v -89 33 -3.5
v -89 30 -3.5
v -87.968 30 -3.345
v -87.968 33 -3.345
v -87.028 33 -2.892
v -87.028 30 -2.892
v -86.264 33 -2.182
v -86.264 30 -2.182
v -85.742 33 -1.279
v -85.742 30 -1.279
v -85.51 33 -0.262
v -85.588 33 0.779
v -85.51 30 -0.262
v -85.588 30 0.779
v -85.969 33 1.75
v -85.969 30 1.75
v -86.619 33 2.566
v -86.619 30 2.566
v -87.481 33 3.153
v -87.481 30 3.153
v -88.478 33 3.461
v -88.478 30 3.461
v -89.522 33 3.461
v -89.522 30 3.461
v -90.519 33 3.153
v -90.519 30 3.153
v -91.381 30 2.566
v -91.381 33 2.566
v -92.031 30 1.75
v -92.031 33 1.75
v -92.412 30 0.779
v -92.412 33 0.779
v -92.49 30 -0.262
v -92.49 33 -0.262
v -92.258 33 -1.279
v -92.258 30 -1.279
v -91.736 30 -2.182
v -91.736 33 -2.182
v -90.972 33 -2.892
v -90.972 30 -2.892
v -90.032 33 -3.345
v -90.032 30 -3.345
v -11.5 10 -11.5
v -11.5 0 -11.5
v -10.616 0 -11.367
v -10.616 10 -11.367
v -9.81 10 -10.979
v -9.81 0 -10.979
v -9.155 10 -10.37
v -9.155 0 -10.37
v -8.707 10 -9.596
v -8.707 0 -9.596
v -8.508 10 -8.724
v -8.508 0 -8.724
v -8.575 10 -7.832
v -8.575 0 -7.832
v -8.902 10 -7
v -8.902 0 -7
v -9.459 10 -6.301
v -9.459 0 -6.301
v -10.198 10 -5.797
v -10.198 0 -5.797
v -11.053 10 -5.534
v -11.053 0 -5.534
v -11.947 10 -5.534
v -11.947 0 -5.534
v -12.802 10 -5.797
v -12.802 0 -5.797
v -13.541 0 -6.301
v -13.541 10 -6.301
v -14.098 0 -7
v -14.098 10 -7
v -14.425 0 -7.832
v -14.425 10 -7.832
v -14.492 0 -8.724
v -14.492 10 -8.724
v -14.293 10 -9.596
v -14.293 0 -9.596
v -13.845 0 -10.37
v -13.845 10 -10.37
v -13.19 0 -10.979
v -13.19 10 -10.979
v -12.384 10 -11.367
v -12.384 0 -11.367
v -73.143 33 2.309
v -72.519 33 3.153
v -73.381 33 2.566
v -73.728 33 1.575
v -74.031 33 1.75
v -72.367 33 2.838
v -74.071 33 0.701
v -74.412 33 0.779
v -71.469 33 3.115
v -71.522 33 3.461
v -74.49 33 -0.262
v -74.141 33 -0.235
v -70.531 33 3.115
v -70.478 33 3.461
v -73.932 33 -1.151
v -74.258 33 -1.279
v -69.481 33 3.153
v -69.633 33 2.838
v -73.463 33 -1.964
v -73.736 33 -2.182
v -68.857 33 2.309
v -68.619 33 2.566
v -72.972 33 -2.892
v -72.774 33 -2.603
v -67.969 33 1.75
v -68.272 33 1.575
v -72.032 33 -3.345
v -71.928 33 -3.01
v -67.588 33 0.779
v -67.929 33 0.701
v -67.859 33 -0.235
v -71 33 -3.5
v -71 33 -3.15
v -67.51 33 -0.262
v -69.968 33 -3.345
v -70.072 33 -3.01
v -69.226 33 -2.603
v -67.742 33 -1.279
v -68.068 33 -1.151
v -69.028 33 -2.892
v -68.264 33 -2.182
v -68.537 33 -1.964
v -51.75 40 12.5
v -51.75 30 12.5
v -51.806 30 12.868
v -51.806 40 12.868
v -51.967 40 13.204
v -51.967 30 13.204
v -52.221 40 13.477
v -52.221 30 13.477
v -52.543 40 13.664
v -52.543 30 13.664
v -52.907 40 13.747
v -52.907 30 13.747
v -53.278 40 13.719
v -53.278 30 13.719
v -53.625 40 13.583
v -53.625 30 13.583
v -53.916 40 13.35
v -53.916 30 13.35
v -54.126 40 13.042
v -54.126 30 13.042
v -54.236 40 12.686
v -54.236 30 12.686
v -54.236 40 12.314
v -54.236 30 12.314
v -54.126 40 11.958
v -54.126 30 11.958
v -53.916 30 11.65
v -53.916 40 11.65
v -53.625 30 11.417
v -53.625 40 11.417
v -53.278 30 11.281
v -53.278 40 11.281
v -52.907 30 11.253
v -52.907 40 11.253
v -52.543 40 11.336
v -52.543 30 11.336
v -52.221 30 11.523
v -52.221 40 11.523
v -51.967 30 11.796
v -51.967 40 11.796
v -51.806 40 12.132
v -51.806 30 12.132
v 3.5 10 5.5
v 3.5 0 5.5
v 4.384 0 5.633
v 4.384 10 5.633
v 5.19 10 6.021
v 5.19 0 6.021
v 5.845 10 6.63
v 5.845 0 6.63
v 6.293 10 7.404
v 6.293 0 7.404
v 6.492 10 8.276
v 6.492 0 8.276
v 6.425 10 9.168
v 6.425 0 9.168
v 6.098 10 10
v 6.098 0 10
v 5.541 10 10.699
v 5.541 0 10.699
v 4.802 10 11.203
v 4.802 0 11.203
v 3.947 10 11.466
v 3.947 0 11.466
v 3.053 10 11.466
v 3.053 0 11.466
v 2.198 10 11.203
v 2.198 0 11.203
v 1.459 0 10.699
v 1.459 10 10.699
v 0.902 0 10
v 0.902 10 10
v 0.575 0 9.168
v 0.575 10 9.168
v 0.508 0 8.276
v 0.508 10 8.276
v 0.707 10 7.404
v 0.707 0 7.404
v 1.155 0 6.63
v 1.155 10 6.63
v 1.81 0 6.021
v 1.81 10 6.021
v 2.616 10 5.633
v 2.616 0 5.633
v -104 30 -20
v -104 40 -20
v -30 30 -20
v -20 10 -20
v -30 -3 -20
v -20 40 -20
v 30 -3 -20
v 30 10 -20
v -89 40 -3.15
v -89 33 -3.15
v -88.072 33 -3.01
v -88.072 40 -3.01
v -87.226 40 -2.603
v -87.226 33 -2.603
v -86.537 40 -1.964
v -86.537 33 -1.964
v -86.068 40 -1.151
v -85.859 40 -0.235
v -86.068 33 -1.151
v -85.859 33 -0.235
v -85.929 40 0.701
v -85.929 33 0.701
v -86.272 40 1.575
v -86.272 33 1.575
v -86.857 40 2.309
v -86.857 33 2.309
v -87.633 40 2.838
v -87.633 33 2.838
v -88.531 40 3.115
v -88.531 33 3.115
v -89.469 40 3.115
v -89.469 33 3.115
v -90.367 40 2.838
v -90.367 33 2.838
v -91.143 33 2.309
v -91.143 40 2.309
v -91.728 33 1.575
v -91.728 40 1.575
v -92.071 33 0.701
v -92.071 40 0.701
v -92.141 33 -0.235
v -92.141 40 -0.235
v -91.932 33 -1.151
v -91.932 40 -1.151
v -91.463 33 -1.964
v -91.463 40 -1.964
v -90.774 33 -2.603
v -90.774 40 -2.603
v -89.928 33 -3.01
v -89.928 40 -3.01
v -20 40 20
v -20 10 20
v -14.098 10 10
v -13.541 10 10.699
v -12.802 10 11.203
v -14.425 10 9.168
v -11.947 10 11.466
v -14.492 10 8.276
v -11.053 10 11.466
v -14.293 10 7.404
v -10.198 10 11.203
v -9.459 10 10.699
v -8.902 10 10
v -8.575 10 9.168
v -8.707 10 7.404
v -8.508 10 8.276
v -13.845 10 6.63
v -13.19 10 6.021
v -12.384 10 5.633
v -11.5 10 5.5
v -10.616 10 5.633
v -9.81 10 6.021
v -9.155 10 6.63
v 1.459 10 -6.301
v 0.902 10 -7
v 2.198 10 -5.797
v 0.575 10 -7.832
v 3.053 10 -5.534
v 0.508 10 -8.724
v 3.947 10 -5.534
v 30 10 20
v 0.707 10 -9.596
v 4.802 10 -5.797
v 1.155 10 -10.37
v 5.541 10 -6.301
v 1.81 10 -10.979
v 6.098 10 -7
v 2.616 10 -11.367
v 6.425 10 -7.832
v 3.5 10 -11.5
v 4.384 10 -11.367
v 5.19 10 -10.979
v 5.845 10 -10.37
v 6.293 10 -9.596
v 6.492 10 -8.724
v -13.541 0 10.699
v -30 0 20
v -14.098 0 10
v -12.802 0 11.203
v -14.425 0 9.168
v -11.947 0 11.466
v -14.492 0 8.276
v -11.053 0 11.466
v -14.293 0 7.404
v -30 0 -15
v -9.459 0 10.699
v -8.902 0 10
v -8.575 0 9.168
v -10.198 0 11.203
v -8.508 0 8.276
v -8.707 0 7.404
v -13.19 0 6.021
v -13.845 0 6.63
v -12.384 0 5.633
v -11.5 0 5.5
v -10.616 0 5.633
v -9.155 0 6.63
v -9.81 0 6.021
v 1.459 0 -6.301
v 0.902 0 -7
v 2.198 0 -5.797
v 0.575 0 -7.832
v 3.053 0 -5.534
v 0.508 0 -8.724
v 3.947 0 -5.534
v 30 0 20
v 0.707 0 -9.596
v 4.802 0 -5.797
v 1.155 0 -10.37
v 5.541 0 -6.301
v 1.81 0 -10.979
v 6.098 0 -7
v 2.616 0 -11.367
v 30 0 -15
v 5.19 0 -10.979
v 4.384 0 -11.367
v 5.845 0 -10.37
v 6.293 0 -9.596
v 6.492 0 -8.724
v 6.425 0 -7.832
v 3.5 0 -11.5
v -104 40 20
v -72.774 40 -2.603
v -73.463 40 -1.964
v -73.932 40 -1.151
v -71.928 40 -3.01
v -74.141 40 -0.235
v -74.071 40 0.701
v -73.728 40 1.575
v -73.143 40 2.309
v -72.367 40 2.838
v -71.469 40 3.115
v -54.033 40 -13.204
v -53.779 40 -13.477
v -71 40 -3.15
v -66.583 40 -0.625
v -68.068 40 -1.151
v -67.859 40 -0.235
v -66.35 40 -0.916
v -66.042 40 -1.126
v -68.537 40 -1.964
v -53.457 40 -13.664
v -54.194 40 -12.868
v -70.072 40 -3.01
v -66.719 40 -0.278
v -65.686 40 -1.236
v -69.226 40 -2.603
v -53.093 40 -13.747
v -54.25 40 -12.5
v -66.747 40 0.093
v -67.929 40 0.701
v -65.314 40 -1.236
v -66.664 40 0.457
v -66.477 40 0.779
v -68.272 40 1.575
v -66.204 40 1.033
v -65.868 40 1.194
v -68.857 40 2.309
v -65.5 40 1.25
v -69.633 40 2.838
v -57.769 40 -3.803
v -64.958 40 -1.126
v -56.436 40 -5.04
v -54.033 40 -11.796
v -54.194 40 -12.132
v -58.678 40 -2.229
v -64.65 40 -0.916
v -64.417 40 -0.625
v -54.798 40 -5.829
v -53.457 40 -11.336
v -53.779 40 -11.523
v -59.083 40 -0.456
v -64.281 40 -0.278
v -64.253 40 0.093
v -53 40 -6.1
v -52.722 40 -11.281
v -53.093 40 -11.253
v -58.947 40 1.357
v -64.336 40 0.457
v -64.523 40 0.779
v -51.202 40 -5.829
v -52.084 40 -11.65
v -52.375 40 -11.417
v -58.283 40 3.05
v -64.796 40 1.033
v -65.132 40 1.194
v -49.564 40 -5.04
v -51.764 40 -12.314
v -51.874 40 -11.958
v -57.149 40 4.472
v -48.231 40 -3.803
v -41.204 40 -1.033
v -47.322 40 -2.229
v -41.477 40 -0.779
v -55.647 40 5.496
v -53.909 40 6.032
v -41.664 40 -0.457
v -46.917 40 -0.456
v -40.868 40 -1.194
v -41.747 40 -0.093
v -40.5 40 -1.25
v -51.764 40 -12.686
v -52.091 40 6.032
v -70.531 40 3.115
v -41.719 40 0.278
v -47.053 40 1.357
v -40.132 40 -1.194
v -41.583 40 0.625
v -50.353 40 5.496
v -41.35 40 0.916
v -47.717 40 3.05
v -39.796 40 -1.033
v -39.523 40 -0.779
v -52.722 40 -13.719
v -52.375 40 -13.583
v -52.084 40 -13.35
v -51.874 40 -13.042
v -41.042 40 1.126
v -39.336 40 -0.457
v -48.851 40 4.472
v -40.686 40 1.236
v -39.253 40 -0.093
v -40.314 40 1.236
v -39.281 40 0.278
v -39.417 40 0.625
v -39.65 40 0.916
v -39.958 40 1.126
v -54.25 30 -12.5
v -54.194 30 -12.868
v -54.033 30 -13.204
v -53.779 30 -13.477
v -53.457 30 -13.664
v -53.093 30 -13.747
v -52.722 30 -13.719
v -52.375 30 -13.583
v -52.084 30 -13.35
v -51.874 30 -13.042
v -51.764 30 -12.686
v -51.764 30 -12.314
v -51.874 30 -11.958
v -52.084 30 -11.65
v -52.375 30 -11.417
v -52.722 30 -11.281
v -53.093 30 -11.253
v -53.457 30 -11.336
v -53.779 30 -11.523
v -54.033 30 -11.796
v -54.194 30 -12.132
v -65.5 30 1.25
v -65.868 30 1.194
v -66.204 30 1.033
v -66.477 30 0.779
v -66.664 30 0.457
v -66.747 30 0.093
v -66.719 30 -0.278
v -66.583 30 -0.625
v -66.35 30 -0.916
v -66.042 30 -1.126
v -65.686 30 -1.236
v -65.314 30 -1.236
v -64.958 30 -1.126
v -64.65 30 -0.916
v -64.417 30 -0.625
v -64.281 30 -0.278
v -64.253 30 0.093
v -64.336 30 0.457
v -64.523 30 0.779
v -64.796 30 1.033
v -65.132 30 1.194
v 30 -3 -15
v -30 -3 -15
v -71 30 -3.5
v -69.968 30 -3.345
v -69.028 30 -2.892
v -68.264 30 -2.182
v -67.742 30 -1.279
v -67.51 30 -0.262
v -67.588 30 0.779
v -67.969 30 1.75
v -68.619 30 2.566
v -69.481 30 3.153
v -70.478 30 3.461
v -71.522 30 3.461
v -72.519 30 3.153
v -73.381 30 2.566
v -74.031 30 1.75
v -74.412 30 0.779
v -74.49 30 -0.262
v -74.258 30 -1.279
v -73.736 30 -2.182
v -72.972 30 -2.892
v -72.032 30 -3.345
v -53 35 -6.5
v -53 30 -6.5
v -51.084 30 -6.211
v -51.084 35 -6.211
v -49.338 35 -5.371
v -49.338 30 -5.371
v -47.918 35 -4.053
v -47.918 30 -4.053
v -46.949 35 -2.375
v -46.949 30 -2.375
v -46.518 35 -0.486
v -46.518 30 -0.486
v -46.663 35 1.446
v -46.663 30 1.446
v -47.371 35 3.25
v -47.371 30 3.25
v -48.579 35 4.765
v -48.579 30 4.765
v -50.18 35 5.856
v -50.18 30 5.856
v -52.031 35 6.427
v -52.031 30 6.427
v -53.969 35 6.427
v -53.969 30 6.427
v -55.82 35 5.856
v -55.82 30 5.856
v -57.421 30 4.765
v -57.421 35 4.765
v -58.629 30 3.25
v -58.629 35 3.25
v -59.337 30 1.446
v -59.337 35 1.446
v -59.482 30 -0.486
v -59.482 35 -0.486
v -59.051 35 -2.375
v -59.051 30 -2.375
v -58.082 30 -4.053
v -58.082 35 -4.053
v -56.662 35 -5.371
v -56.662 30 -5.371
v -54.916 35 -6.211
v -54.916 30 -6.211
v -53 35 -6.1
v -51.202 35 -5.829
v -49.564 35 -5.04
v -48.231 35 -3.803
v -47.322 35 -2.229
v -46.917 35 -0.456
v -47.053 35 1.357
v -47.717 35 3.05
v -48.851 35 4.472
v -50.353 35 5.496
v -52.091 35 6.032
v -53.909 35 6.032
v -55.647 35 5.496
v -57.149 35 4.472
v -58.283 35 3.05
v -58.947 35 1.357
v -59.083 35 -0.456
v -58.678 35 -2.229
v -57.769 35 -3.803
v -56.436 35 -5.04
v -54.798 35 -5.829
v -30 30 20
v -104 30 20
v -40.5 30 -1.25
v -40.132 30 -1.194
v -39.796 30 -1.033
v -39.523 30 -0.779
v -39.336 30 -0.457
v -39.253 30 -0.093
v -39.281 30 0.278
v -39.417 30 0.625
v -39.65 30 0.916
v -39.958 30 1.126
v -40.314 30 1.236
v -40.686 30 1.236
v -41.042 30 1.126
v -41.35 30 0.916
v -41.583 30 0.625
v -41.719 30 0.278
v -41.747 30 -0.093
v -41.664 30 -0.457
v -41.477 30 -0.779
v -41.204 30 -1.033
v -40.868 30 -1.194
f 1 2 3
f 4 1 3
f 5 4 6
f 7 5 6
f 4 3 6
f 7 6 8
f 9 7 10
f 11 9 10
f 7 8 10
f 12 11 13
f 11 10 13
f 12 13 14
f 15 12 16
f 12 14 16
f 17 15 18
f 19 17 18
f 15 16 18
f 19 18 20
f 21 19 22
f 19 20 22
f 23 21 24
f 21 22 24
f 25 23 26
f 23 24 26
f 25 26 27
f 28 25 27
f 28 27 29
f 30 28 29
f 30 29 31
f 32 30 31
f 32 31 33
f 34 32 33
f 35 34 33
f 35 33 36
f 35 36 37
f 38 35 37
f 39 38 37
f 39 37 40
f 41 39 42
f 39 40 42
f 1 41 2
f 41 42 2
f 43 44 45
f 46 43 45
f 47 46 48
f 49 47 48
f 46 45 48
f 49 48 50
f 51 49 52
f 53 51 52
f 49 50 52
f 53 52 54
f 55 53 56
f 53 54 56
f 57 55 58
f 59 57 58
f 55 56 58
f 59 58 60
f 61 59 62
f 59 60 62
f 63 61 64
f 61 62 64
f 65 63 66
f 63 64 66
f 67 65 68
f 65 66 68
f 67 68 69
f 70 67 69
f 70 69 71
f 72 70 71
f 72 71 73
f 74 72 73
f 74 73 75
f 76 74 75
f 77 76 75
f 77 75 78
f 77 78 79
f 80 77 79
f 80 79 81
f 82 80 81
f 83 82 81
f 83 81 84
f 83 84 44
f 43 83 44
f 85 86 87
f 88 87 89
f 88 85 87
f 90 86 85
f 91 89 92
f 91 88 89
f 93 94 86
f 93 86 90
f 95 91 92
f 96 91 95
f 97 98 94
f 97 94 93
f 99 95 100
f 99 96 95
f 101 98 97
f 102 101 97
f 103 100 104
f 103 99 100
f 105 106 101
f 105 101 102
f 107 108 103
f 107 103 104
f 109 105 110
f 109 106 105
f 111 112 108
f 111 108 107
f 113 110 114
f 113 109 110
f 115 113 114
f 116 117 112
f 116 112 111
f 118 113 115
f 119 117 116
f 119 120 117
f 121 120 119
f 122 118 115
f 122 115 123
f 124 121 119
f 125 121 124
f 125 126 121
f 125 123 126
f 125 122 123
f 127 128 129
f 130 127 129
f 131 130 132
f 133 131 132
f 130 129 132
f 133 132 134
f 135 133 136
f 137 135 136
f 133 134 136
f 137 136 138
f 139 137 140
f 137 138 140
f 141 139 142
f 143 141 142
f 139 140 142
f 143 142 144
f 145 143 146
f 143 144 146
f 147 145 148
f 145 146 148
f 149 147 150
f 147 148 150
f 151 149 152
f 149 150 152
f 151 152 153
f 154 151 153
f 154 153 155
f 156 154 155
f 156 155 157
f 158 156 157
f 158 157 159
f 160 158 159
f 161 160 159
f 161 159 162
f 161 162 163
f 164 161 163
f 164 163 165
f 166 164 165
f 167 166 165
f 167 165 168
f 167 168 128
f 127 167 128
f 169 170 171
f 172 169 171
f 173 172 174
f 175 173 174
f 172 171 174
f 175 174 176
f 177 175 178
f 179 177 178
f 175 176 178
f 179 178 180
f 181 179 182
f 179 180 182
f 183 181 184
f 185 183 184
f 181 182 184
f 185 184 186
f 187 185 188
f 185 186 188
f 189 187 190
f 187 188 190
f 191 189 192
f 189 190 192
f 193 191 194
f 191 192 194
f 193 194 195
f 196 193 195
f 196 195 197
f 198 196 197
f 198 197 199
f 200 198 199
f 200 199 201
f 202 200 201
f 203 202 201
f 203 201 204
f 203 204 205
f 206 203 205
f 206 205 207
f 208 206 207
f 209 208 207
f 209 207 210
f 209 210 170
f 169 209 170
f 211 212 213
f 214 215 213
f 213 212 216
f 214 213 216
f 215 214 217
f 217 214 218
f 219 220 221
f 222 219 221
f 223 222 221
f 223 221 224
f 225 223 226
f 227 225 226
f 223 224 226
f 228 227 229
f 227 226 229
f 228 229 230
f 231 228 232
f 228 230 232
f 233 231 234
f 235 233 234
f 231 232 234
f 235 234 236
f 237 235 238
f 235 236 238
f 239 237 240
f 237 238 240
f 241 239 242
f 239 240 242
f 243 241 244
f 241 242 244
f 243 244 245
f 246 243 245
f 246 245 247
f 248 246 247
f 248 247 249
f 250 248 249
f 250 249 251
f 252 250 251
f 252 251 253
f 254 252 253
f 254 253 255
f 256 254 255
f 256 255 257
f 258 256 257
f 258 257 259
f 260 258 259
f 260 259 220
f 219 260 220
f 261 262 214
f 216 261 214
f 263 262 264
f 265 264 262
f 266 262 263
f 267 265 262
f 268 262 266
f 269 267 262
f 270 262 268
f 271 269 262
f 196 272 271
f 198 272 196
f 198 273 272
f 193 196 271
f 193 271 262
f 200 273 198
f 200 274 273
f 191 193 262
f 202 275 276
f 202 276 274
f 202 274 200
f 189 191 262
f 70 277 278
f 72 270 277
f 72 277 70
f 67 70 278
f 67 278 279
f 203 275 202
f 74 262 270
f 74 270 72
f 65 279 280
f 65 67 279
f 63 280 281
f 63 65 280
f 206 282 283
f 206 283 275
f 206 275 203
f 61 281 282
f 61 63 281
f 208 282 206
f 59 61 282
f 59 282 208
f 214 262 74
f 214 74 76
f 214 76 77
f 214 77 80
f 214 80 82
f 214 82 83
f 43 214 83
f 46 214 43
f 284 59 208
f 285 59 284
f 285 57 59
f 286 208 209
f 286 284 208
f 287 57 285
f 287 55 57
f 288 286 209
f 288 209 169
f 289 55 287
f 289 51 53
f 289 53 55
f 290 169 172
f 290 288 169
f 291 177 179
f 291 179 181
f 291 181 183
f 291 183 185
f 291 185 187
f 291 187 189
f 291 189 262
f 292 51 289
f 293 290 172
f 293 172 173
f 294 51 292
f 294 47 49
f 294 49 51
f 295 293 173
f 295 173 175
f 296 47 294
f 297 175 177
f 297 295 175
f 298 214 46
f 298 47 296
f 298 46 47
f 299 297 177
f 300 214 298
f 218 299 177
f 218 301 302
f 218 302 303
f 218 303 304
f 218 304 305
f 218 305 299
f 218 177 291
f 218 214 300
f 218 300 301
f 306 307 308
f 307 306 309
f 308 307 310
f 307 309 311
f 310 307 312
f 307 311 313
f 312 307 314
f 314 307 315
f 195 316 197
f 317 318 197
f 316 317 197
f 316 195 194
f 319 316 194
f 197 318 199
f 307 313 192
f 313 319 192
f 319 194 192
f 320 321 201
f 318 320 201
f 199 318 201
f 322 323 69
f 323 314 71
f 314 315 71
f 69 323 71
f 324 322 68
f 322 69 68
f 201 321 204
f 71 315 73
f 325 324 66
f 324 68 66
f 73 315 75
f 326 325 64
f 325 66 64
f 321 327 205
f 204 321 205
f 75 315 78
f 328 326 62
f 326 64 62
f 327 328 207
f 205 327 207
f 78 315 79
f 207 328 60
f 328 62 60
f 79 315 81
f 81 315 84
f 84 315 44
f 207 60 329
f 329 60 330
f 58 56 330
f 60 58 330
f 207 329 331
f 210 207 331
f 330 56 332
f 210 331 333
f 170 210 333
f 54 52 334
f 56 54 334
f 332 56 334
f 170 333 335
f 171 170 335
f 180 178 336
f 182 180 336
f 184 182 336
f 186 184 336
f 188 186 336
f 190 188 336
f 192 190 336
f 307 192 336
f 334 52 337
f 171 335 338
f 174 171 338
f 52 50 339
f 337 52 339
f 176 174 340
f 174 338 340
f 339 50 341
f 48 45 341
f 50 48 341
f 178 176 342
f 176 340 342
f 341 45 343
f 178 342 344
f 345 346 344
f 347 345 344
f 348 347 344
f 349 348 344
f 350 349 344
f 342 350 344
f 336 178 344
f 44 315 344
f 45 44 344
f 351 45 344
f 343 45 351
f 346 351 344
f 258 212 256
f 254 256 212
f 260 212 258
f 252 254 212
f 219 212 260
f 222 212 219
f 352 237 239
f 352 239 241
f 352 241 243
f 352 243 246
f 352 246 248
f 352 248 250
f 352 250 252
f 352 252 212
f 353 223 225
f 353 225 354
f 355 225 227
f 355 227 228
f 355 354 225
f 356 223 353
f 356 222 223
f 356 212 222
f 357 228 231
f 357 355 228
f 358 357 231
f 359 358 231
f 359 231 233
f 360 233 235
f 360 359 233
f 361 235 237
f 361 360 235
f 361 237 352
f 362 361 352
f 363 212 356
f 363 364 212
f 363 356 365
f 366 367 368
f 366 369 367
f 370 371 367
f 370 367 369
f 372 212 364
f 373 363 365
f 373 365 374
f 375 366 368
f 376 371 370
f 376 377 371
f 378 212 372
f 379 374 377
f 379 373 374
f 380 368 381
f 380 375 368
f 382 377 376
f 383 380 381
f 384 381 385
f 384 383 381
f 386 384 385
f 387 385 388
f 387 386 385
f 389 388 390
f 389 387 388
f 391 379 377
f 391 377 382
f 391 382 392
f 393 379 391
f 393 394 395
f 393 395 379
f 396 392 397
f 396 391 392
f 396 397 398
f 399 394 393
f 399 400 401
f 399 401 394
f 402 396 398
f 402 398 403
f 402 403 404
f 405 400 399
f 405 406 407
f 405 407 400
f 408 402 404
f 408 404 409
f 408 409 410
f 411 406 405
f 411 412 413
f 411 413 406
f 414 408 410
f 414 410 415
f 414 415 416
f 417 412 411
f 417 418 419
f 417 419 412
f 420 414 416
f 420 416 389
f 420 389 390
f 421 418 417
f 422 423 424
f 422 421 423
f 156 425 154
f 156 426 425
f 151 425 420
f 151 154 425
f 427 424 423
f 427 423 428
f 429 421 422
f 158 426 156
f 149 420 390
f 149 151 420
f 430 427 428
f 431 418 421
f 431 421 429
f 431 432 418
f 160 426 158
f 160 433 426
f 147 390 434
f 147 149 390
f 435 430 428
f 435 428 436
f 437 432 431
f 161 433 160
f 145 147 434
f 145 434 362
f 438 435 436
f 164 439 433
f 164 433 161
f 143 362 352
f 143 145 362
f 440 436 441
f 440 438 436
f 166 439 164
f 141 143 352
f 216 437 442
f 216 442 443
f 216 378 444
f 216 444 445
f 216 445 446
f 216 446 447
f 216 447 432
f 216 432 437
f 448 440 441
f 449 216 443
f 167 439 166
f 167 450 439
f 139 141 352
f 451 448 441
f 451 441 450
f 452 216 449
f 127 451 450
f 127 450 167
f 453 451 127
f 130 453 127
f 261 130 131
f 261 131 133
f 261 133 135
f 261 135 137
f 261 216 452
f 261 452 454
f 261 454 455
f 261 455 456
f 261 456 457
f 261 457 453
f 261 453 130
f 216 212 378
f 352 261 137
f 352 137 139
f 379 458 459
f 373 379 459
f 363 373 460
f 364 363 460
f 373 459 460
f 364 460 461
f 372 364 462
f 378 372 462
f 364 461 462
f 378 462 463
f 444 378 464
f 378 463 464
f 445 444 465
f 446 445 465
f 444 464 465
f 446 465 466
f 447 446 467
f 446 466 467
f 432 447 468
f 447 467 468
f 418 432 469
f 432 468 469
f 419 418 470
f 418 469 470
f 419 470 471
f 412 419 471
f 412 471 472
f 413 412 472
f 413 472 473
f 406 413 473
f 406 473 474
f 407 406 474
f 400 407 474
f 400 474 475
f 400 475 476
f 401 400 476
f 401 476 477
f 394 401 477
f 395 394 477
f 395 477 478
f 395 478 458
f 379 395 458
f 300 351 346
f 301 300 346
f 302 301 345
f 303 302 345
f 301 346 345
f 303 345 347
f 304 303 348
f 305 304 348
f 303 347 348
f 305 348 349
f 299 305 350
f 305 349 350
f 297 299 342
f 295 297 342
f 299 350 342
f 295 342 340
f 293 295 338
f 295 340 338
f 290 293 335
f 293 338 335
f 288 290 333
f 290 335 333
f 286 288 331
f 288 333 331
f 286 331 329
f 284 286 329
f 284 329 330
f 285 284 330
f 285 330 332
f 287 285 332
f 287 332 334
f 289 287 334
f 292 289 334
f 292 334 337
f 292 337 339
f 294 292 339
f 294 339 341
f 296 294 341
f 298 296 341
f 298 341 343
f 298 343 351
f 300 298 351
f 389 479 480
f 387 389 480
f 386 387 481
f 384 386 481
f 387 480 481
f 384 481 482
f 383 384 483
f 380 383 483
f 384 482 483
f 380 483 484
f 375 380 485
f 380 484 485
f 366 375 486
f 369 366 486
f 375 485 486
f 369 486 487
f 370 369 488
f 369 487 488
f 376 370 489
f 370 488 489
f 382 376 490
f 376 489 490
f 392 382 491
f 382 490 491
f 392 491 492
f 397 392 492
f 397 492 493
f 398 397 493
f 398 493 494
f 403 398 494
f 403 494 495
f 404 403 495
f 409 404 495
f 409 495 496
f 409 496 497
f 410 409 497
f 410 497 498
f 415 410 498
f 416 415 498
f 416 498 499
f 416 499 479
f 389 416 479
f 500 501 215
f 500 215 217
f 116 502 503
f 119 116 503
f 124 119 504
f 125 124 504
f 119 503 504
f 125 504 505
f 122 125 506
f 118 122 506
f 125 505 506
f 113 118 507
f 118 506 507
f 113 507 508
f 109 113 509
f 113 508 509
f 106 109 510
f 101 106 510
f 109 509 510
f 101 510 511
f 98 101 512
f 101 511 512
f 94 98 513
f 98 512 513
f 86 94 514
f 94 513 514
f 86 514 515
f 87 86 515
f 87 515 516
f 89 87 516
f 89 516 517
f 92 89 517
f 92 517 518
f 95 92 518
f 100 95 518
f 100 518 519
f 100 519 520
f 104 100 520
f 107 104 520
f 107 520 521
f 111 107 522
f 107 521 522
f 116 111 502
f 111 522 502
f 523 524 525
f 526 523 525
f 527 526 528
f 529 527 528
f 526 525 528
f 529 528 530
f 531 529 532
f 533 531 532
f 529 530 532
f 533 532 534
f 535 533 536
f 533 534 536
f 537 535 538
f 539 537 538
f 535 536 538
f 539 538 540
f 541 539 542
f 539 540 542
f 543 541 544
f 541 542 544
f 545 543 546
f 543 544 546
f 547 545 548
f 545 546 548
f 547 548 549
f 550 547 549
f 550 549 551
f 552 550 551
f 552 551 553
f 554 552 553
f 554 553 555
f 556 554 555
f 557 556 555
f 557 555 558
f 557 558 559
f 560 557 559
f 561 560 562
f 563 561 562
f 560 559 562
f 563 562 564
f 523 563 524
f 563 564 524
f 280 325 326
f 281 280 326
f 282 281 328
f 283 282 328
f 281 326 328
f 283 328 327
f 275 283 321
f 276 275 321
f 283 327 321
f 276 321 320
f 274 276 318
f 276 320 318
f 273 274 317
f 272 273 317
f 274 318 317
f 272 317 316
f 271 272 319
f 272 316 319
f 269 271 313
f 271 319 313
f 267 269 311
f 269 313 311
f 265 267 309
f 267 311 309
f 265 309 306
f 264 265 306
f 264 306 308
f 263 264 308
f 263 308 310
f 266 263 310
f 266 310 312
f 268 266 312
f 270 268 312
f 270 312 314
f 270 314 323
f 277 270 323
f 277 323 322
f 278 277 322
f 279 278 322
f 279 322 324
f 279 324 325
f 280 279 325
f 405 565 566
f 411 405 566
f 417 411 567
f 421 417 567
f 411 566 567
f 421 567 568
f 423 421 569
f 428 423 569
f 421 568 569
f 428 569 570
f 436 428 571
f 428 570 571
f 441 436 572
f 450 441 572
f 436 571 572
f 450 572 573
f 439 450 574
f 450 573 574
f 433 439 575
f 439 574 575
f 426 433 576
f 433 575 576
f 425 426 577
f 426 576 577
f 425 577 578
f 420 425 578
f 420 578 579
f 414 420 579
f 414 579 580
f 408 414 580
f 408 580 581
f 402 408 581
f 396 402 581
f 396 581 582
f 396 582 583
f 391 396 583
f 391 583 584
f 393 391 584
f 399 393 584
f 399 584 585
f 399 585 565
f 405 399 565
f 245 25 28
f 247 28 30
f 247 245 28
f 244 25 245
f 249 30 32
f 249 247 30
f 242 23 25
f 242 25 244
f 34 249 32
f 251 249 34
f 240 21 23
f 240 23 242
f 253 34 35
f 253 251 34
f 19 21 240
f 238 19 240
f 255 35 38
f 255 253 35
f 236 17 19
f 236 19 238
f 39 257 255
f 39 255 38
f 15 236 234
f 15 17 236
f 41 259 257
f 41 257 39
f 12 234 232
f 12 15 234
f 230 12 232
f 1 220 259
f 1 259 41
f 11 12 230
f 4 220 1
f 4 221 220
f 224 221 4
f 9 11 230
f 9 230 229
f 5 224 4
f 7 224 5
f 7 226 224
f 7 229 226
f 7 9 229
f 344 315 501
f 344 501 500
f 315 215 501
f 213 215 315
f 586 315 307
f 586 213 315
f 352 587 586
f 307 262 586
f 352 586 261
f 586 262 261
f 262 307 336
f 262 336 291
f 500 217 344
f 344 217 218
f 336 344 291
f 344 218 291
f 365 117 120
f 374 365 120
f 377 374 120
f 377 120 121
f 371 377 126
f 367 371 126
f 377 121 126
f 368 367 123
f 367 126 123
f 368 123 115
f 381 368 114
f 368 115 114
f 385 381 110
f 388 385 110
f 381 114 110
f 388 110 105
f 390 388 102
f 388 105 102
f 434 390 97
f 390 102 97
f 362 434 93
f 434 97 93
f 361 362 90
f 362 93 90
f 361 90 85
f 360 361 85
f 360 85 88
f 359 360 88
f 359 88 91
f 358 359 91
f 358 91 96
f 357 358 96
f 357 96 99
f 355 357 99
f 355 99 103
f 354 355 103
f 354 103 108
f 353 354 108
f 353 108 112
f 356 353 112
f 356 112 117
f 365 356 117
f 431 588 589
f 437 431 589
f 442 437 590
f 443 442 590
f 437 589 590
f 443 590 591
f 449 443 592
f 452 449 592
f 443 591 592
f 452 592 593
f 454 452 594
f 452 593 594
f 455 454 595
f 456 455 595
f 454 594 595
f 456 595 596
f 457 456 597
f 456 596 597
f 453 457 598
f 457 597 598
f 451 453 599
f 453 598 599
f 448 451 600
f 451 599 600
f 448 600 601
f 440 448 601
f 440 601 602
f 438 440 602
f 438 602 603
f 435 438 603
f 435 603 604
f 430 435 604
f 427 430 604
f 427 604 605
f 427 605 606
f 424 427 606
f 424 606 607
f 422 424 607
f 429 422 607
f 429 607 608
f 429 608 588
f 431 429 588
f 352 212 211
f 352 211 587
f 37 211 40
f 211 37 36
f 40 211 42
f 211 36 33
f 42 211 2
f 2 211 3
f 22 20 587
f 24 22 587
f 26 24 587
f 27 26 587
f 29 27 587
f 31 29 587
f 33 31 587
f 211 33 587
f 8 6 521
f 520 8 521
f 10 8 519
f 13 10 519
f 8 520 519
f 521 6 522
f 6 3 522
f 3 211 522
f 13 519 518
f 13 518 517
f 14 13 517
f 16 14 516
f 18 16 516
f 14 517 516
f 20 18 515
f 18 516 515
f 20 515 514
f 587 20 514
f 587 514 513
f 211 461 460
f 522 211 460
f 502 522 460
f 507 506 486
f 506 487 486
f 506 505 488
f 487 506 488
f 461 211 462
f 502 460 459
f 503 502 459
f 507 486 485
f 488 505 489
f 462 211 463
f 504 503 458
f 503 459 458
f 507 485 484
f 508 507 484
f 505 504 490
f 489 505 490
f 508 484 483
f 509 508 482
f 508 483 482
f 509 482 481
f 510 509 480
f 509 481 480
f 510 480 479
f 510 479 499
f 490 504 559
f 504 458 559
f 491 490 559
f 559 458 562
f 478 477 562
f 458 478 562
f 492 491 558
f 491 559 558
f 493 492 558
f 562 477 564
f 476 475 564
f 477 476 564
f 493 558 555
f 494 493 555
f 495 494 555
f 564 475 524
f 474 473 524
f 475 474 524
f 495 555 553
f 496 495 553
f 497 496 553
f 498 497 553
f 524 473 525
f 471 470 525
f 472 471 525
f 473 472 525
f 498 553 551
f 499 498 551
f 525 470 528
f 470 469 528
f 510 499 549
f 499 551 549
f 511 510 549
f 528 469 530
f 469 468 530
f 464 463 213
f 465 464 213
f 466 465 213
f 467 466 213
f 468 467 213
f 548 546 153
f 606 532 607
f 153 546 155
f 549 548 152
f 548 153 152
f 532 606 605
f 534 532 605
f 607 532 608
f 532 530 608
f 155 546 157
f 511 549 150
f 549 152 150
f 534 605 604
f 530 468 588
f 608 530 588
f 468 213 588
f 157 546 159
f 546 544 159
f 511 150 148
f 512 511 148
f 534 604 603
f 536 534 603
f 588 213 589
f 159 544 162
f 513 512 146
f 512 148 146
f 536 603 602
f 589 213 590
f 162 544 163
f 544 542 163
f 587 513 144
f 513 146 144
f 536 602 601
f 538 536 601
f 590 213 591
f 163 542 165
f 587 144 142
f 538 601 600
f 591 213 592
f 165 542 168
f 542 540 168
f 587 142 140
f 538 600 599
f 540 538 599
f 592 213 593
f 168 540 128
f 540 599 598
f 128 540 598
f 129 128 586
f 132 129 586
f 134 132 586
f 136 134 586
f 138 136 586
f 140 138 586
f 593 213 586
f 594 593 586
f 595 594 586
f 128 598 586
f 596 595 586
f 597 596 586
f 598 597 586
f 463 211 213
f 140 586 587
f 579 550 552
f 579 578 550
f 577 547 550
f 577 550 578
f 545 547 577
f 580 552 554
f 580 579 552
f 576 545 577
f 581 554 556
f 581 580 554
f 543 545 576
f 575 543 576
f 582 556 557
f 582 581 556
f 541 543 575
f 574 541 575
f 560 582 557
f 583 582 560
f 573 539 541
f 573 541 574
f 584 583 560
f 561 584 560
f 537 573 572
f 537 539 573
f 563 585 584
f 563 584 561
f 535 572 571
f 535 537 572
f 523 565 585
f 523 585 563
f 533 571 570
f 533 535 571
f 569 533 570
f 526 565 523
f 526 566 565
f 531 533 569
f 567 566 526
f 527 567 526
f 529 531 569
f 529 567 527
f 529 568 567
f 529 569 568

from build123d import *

# Parameters (mm, degrees)
SKETCH1_W           = 60
SKETCH1_H           = 40
BOSS_EXTRUDE1_DEPTH = 10
SKETCH2_W           = 10
SKETCH2_H           = 40
BOSS_EXTRUDE2_DEPTH = 30
SKETCH3_W           = 40
SKETCH3_H           = 10
BOSS_EXTRUDE3_DEPTH = 74
SKETCH4_R           = 6.1
SKETCH4_R_2         = 3.15
CUT_EXTRUDE1_DEPTH  = 74
SKETCH5_R           = 3
CUT_EXTRUDE2_DEPTH  = 74
SKETCH6_R           = 3.5
CUT_EXTRUDE3_DEPTH  = 3
SKETCH7_R           = 6.5
CUT_EXTRUDE4_DEPTH  = 5
M3_TAPPED_HOLE1_D   = 2.5
CIRPATTERN1_COUNT   = 4
SKETCH10_W          = 60
SKETCH10_H          = 5
BOSS_EXTRUDE4_DEPTH = 3


with BuildPart() as part:
    # Sketch1 → Boss-Extrude1 (new body)
    with BuildSketch(Plane(origin=(0, 0, 0), x_dir=(1, 0, 0), z_dir=(0, 1, 0))):
        Rectangle(SKETCH1_W, SKETCH1_H)
    extrude(amount=BOSS_EXTRUDE1_DEPTH)

    # Sketch2 → Boss-Extrude2 (add)
    with BuildSketch(Plane(origin=(0, 10, 0), x_dir=(1, 0, 0), z_dir=(0, 1, 0))):
        with Locations((-25, 0)):
            Rectangle(SKETCH2_W, SKETCH2_H)
    extrude(amount=BOSS_EXTRUDE2_DEPTH)

    # Sketch3 → Boss-Extrude3 (add)
    with BuildSketch(Plane.ZY.offset(30)):
        with Locations((0, 35)):
            Rectangle(SKETCH3_W, SKETCH3_H)
    extrude(amount=BOSS_EXTRUDE3_DEPTH)

    # Sketch4 → Cut-Extrude1 (cut)
    with BuildSketch(Plane.XZ.offset(-30)):
        with Locations(Location((-53, 0, 0), (0, 0, 270))):
            Circle(SKETCH4_R)
        with Locations(Location((-71, 0, 0), (0, 0, 270))):
            Circle(SKETCH4_R_2)
        with Locations(Location((-89, 0, 0), (0, 0, 270))):
            Circle(SKETCH4_R_2)
    extrude(amount=-CUT_EXTRUDE1_DEPTH, mode=Mode.SUBTRACT)

    # Sketch5 → Cut-Extrude2 (cut)
    with BuildSketch(Plane.XZ):
        with Locations(Location((-11.5, 8.5, 0), (0, 0, 270))):
            Circle(SKETCH5_R)
        with Locations(Location((-11.5, -8.5, 0), (0, 0, 270))):
            Circle(SKETCH5_R)
        with Locations(Location((3.5, 8.5, 0), (0, 0, 270))):
            Circle(SKETCH5_R)
        with Locations(Location((3.5, -8.5, 0), (0, 0, 270))):
            Circle(SKETCH5_R)
    extrude(amount=-CUT_EXTRUDE2_DEPTH, mode=Mode.SUBTRACT)

    # Sketch6 → Cut-Extrude3 (cut)
    with BuildSketch(Plane.XZ.offset(-30)):
        with Locations(Location((-89, 0, 0), (0, 0, 270))):
            Circle(SKETCH6_R)
        with Locations(Location((-71, 0, 0), (0, 0, 270))):
            Circle(SKETCH6_R)
    extrude(amount=-CUT_EXTRUDE3_DEPTH, mode=Mode.SUBTRACT)

    # Sketch7 → Cut-Extrude4 (cut)
    with BuildSketch(Plane.XZ.offset(-30)):
        with Locations(Location((-53, 0, 0), (0, 0, 270))):
            Circle(SKETCH7_R)
    extrude(amount=-CUT_EXTRUDE4_DEPTH, mode=Mode.SUBTRACT)

    # M3 Tapped Hole1 (through all)
    with Locations(Plane(origin=(0, 40, 0), x_dir=(1, 0, 0), z_dir=(0, 1, 0))):
        with Locations((-53, 12.5)):
            m3_tapped_hole1 = Hole(M3_TAPPED_HOLE1_D / 2)

    # CirPattern1: M3 Tapped Hole1 ×4 about axis
    cirpattern1_axis = Axis((-53, 0, 0), (0, 1, 0))
    for i in range(1, CIRPATTERN1_COUNT):
        add(m3_tapped_hole1.rotate(cirpattern1_axis, i * 360 / CIRPATTERN1_COUNT), mode=Mode.SUBTRACT)

    # Sketch10 → Boss-Extrude4 (add)
    with BuildSketch(Plane.XZ):
        with Locations((0, -17.5)):
            Rectangle(SKETCH10_W, SKETCH10_H)
    extrude(amount=BOSS_EXTRUDE4_DEPTH)


solid = part.part
